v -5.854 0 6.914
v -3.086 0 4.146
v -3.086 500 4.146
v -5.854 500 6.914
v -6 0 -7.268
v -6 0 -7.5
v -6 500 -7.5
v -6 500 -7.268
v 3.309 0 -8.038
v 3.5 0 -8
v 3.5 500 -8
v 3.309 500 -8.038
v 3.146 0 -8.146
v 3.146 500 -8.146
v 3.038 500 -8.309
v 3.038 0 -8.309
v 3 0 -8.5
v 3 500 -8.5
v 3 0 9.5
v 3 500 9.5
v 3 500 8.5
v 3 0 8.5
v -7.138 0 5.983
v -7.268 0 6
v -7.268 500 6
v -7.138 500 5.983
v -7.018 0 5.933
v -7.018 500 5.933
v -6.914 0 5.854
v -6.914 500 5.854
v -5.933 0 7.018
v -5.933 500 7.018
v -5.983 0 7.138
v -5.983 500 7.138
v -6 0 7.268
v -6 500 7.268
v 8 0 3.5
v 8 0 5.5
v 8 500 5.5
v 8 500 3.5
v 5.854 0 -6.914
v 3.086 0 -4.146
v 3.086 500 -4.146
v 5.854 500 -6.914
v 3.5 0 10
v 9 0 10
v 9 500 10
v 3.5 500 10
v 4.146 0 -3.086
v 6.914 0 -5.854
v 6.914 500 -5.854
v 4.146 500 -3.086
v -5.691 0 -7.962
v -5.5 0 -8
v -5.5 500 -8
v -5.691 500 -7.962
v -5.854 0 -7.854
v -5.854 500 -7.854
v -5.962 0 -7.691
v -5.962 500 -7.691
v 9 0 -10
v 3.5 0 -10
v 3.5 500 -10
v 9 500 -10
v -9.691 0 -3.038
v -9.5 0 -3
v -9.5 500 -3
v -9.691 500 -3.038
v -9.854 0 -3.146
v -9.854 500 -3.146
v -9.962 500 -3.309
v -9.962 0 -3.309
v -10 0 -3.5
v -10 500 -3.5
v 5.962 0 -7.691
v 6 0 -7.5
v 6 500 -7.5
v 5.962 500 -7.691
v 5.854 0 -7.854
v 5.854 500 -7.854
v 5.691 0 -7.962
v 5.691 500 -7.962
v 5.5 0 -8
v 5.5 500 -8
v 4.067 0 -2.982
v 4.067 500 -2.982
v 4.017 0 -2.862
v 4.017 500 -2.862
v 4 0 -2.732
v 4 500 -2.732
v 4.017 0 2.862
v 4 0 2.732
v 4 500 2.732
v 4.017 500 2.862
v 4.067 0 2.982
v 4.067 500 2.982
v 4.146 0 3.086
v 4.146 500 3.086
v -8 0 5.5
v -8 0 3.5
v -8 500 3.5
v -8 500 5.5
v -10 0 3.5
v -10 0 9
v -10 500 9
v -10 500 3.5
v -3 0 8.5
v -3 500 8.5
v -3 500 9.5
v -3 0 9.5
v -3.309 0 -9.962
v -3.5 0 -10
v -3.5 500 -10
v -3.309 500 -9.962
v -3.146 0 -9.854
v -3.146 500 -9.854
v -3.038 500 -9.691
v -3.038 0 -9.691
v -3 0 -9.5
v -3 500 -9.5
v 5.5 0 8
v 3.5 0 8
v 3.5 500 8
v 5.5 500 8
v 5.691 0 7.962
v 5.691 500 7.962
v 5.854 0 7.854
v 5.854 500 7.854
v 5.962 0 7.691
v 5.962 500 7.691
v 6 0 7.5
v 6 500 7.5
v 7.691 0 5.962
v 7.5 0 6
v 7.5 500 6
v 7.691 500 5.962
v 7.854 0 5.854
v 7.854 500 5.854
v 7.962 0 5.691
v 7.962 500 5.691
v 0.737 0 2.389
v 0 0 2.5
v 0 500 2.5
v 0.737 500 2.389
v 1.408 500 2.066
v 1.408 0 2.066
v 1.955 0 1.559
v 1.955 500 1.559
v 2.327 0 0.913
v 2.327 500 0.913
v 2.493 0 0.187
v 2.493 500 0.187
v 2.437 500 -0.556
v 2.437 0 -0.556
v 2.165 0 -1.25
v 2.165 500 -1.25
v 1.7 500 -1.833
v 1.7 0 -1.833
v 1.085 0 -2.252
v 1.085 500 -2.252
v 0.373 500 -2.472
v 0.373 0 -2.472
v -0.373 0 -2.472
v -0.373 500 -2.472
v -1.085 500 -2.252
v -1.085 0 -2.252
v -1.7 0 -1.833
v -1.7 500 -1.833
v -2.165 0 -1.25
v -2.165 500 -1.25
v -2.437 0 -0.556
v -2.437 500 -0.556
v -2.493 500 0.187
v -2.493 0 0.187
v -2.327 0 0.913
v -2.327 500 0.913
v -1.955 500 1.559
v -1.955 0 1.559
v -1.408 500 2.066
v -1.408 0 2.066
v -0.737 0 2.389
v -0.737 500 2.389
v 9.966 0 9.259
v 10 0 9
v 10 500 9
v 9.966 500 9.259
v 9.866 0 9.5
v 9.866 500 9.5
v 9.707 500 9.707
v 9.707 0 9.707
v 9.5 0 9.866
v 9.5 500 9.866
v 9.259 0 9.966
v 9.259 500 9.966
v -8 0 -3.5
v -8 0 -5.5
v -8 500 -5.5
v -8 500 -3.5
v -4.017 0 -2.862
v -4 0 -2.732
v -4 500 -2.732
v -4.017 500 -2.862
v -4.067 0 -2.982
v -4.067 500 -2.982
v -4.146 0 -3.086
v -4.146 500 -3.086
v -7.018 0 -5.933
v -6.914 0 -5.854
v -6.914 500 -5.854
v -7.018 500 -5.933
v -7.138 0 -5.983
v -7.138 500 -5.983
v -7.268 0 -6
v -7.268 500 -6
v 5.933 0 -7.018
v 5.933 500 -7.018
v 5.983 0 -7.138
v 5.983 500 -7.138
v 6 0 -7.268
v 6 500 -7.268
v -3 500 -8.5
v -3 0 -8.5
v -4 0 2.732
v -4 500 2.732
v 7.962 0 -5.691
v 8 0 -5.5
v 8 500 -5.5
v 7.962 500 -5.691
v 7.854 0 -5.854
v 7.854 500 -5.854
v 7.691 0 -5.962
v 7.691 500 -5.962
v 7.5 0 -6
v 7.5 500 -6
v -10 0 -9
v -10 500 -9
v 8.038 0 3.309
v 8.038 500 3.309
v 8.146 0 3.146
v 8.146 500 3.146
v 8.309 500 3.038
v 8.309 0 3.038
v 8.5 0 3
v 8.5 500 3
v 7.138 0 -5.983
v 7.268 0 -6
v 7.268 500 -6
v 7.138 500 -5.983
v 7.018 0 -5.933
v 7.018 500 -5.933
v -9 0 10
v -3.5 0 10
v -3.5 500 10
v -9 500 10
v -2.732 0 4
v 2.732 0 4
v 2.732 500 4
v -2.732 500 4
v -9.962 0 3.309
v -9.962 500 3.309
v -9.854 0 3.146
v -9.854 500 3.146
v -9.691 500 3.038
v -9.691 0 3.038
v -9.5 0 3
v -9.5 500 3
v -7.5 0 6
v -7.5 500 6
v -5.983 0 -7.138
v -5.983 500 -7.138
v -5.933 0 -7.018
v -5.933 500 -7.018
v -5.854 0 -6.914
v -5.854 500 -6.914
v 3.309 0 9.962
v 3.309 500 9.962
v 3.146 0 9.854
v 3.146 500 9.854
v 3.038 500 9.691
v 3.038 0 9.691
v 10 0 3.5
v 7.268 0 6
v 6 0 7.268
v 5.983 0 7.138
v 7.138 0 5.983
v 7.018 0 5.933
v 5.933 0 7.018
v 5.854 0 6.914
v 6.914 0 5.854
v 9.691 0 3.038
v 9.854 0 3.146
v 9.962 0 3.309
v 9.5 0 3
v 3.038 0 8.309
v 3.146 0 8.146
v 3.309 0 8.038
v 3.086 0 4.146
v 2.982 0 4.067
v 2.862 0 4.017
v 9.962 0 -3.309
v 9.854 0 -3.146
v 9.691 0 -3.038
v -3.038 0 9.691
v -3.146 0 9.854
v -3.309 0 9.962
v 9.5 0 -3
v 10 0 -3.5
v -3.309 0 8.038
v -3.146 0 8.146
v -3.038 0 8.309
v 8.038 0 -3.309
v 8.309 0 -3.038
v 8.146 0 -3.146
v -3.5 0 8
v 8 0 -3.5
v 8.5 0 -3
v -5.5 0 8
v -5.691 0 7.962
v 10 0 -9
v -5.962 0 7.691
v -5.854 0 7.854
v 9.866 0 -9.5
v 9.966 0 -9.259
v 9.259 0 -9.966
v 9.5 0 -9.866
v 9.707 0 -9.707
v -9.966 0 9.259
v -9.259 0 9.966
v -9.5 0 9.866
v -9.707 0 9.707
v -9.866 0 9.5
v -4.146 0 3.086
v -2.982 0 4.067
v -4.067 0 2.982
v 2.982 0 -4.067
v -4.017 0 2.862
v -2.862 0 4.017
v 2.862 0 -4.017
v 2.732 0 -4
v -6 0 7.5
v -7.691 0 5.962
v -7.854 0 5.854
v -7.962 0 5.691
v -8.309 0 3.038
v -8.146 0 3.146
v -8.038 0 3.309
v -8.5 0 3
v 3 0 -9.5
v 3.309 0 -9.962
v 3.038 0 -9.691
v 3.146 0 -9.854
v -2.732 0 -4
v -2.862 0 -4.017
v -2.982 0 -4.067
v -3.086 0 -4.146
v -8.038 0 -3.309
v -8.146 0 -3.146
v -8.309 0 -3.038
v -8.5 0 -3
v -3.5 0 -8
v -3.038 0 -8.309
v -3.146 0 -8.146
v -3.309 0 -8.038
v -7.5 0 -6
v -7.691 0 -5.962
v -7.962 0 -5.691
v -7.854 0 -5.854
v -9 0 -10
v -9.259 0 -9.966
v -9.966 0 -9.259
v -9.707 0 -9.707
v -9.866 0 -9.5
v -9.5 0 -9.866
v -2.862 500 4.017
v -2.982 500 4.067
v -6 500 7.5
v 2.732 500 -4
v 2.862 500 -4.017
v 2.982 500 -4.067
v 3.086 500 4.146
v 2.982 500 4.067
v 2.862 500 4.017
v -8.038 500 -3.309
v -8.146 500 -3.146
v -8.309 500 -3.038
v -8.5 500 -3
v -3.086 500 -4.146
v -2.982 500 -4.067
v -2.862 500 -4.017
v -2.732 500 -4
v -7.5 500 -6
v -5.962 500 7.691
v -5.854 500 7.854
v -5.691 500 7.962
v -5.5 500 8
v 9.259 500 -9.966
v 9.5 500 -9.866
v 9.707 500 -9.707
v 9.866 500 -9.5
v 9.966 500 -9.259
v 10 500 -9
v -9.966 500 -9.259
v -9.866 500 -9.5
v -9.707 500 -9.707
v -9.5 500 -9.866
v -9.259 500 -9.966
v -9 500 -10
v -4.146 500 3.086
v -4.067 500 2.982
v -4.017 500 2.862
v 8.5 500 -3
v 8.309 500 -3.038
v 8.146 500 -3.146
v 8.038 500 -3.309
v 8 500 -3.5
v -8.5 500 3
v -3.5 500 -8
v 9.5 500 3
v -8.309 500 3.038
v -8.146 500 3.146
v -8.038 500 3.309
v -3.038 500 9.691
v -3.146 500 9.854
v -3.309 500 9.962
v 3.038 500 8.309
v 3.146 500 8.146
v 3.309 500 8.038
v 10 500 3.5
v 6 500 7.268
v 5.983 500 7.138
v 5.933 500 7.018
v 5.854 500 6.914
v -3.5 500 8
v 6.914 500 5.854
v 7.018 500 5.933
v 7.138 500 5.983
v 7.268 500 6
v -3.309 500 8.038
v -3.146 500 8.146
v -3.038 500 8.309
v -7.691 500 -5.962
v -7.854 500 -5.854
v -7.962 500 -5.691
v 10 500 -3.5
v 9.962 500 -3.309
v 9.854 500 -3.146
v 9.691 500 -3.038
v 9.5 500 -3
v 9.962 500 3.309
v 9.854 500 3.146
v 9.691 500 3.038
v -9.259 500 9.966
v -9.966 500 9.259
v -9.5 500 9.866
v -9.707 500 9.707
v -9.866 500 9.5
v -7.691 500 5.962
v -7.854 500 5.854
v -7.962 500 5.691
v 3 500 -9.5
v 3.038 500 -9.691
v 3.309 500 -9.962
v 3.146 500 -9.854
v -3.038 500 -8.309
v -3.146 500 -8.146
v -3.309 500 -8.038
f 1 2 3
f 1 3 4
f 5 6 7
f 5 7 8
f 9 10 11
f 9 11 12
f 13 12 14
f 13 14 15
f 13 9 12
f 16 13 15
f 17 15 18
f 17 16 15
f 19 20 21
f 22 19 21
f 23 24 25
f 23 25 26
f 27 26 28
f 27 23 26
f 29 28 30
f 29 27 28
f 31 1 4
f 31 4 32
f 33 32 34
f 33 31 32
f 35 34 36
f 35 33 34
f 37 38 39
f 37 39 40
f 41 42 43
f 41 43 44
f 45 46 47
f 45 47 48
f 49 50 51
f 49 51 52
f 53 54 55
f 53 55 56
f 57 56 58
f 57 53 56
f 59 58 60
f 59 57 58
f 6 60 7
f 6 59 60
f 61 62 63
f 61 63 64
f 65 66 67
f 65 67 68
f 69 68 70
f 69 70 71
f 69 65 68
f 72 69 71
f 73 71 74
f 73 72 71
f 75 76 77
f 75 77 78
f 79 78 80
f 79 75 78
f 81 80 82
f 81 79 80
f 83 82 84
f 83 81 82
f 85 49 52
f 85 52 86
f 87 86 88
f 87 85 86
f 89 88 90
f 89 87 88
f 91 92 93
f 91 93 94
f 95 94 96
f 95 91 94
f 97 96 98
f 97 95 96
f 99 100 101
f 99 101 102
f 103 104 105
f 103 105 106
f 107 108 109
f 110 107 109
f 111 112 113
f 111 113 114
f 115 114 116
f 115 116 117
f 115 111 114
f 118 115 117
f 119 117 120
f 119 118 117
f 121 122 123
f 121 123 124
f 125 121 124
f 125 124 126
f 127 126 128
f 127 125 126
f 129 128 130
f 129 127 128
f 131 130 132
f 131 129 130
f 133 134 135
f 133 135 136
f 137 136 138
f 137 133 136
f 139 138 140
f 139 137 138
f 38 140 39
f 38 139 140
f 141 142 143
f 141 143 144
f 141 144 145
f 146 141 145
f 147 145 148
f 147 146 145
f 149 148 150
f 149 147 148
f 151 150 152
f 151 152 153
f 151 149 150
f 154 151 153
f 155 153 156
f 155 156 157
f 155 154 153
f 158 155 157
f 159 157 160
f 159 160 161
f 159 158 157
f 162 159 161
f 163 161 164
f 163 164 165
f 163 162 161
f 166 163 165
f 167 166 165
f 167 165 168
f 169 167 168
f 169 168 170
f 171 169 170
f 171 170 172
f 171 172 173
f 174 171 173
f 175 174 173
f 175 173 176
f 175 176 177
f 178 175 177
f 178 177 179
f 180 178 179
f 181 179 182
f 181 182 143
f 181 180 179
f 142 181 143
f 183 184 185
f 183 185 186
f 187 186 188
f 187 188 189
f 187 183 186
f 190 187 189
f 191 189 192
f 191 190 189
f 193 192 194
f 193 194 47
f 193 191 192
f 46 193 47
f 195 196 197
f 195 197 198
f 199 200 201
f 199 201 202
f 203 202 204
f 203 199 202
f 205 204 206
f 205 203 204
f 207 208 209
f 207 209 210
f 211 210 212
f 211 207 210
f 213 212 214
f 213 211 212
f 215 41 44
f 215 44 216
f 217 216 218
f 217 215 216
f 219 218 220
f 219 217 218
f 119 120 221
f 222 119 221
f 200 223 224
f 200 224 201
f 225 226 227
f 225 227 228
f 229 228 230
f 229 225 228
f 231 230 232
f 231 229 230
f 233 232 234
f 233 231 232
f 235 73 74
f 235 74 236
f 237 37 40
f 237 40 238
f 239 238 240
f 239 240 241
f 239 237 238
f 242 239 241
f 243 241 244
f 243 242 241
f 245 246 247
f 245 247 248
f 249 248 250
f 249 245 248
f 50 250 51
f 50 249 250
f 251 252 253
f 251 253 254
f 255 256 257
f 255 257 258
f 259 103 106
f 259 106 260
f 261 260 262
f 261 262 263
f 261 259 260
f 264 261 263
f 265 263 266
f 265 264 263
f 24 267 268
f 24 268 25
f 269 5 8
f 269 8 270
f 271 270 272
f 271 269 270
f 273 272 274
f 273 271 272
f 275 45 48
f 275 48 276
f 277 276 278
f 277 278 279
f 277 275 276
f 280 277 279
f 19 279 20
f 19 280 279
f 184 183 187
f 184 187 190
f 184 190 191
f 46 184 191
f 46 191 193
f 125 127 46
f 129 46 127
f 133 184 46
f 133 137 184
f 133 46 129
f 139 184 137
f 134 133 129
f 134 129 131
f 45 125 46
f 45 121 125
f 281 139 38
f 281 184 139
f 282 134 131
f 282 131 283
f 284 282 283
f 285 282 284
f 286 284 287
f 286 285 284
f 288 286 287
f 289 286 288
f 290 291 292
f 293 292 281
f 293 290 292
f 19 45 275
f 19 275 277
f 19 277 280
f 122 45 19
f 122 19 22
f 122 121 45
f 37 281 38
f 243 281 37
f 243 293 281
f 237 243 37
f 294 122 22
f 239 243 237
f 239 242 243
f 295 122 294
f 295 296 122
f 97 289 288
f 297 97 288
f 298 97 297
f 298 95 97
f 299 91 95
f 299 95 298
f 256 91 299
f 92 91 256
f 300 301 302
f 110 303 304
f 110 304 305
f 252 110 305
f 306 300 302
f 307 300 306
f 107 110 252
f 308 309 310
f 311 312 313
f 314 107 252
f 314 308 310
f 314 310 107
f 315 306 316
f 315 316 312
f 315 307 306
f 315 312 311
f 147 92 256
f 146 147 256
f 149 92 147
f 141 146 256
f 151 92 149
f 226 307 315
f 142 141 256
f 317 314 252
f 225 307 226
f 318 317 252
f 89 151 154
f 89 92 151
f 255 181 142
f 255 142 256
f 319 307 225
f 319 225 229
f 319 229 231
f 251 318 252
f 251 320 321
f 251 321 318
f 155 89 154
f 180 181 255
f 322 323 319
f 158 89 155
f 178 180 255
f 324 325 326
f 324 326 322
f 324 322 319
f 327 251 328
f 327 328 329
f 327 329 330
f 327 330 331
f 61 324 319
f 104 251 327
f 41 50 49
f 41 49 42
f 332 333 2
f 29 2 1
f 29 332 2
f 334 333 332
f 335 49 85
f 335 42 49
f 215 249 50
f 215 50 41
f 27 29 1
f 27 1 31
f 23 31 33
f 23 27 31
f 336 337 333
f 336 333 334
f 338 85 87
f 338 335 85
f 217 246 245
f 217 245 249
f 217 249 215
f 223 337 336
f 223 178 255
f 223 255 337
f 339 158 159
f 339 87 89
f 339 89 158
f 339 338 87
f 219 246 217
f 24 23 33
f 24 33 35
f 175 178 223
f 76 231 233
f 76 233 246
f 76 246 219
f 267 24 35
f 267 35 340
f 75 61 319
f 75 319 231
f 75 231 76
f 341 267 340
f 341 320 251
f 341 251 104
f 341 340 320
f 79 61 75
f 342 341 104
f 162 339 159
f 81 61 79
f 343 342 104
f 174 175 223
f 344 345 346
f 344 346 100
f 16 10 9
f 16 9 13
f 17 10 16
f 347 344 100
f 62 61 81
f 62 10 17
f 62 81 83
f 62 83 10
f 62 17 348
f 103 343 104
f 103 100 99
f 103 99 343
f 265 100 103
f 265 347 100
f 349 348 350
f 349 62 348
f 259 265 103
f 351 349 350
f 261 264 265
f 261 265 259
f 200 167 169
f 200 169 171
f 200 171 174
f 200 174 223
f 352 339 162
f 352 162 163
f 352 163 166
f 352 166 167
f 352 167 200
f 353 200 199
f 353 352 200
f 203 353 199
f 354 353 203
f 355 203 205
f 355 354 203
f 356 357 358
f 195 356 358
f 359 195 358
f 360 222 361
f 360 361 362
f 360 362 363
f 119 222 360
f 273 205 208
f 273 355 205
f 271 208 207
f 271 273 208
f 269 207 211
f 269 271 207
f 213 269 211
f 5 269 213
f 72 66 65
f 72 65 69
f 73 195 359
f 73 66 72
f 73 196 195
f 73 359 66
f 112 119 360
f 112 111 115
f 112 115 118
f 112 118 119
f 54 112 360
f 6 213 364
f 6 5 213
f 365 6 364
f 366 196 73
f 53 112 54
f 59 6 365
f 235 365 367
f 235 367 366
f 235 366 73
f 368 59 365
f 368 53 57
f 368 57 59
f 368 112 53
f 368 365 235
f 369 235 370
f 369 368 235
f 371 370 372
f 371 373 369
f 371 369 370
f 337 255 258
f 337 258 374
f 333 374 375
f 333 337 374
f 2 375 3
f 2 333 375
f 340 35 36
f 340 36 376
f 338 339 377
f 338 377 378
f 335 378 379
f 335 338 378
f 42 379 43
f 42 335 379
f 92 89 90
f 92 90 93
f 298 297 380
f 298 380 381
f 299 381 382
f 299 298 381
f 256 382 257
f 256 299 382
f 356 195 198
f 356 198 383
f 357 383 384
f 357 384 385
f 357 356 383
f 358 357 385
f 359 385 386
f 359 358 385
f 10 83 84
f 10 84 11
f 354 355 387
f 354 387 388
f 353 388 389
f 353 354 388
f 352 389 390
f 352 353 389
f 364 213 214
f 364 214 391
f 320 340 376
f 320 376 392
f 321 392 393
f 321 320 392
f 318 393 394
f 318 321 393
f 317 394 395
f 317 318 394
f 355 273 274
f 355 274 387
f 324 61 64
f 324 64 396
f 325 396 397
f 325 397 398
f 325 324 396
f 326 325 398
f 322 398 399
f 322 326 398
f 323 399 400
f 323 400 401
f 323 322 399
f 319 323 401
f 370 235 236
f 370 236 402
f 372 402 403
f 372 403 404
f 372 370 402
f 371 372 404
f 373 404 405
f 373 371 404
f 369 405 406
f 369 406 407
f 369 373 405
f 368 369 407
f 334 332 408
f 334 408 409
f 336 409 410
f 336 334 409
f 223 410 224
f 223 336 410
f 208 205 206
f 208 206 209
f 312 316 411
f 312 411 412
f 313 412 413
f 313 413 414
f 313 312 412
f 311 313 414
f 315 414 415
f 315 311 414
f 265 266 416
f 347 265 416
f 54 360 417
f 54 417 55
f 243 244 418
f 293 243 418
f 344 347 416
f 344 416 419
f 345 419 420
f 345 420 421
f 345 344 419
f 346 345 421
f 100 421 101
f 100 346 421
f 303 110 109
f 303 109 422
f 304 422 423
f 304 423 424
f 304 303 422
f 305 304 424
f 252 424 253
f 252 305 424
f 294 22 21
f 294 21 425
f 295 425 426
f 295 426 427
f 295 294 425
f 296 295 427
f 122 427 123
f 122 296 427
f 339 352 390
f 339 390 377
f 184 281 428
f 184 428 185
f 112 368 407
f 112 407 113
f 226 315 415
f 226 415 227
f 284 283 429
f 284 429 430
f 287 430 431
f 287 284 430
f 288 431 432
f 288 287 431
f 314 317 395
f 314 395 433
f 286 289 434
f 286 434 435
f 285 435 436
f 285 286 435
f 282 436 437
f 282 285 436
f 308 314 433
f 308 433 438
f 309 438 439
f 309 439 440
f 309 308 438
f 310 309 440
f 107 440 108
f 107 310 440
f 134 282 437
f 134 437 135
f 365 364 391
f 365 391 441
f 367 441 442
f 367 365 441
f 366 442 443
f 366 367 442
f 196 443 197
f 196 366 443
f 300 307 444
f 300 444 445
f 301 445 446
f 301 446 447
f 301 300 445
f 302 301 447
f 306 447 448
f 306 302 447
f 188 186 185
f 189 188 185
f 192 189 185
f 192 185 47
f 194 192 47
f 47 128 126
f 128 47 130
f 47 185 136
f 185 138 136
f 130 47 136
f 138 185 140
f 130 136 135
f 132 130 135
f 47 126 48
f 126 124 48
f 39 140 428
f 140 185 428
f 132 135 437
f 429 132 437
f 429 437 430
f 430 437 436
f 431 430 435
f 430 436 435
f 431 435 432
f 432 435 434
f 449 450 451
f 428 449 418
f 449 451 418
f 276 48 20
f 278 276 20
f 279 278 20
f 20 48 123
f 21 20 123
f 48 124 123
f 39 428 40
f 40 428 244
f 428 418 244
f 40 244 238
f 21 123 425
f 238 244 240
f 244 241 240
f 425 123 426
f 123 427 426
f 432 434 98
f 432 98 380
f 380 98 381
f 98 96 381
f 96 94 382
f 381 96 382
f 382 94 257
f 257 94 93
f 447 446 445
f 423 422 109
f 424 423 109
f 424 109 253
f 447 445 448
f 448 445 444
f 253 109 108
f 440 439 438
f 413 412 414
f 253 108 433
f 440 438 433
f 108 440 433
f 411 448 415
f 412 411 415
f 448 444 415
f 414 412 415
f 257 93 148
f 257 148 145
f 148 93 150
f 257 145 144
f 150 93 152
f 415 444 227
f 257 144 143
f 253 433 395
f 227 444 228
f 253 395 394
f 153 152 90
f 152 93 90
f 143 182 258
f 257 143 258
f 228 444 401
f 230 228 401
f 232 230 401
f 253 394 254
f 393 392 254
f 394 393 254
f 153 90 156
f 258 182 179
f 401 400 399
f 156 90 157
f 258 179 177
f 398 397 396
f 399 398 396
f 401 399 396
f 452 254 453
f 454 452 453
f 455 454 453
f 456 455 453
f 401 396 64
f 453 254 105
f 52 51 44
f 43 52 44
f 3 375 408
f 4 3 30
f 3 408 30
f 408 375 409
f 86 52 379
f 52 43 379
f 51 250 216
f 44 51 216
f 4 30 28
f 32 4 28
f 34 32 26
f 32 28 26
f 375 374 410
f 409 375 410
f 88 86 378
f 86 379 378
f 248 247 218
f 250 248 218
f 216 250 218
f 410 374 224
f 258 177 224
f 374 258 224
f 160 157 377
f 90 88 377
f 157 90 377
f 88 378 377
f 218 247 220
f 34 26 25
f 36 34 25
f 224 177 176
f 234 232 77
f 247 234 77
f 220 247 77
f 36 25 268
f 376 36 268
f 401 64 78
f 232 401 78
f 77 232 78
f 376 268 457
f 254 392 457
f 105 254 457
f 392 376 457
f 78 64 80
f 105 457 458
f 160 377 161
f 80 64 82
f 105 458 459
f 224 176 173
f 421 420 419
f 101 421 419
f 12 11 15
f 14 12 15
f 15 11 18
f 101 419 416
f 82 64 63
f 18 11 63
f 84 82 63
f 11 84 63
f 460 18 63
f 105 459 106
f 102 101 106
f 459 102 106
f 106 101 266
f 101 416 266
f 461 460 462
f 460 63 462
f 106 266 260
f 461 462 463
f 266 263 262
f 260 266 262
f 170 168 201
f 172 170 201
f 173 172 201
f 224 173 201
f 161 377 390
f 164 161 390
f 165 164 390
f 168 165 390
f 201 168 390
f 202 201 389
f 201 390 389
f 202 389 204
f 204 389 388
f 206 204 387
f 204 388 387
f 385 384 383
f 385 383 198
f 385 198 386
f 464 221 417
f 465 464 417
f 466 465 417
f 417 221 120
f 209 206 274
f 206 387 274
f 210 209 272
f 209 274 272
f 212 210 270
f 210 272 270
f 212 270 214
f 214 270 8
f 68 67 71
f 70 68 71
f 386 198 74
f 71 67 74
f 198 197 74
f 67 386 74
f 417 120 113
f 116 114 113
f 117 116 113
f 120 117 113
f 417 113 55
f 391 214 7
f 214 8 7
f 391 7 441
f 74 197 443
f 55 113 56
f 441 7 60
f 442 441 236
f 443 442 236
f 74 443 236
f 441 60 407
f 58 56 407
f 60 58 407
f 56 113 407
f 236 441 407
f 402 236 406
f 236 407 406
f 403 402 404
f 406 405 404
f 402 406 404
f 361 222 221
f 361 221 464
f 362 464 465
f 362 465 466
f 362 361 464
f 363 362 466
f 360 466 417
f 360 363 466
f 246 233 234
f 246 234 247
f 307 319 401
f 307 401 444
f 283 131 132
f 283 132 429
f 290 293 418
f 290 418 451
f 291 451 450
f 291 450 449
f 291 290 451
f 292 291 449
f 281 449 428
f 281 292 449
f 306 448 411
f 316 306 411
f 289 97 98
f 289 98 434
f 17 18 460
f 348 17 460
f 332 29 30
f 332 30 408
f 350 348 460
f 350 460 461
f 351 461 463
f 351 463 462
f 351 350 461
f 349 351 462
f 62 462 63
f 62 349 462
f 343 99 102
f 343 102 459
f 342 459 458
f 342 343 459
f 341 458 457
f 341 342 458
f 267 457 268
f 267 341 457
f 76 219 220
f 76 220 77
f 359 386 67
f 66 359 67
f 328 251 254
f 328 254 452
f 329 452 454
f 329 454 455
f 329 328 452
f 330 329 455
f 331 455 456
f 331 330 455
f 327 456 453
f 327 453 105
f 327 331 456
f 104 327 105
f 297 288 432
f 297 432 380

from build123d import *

# Parameters (mm, degrees)
SKETCH1_R           = 2.5
BOSS_EXTRUDE1_DEPTH = 500


with BuildPart() as part:
    # Sketch1 → Boss-Extrude1 (new body)
    with BuildSketch(Plane(origin=(0, 0, 0), x_dir=(1, 0, 0), z_dir=(0, 1, 0))):
        with BuildLine():
            Line((10, 9), (10, 3.5))
            ThreePointArc((10, 3.5), (9.853553391, 3.146446609), (9.5, 3))
            Line((9.5, 3), (8.5, 3))
            ThreePointArc((8.5, 3), (8.146446609, 3.146446609), (8, 3.5))
            Line((8, 3.5), (8, 5.5))
            ThreePointArc((8, 5.5), (7.853553391, 5.853553391), (7.5, 6))
            Line((7.5, 6), (7.267766953, 6))
            ThreePointArc((7.267766953, 6), (7.076425237, 5.961939766), (6.914213562, 5.853553391))
            Line((6.914213562, 5.853553391), (4.146446609, 3.085786438))
            ThreePointArc((4.146446609, 3.085786438), (4.038060234, 2.923574763), (4, 2.732233047))
            Line((4, 2.732233047), (4, -2.732233047))
            ThreePointArc((4, -2.732233047), (4.038060234, -2.923574763), (4.146446609, -3.085786438))
            Line((4.146446609, -3.085786438), (6.914213562, -5.853553391))
            ThreePointArc((6.914213562, -5.853553391), (7.076425237, -5.961939766), (7.267766953, -6))
            Line((7.267766953, -6), (7.5, -6))
            ThreePointArc((7.5, -6), (7.853553391, -5.853553391), (8, -5.5))
            Line((8, -5.5), (8, -3.5))
            ThreePointArc((8, -3.5), (8.146446609, -3.146446609), (8.5, -3))
            Line((8.5, -3), (9.5, -3))
            ThreePointArc((9.5, -3), (9.853553391, -3.146446609), (10, -3.5))
            Line((10, -3.5), (10, -9))
            ThreePointArc((10, -9), (9.707106781, -9.707106781), (9, -10))
            Line((9, -10), (3.5, -10))
            ThreePointArc((3.5, -10), (3.146446609, -9.853553391), (3, -9.5))
            Line((3, -9.5), (3, -8.5))
            ThreePointArc((3, -8.5), (3.146446609, -8.146446609), (3.5, -8))
            Line((3.5, -8), (5.5, -8))
            ThreePointArc((5.5, -8), (5.853553391, -7.853553391), (6, -7.5))
            Line((6, -7.5), (6, -7.267766953))
            ThreePointArc((6, -7.267766953), (5.961939766, -7.076425237), (5.853553391, -6.914213562))
            Line((5.853553391, -6.914213562), (3.085786438, -4.146446609))
            ThreePointArc((3.085786438, -4.146446609), (2.923574763, -4.038060234), (2.732233047, -4))
            Line((2.732233047, -4), (-2.732233047, -4))
            ThreePointArc((-2.732233047, -4), (-2.923574763, -4.038060234), (-3.085786438, -4.146446609))
            Line((-3.085786438, -4.146446609), (-5.853553391, -6.914213562))
            ThreePointArc((-5.853553391, -6.914213562), (-5.961939766, -7.076425237), (-6, -7.267766953))
            Line((-6, -7.267766953), (-6, -7.5))
            ThreePointArc((-6, -7.5), (-5.853553391, -7.853553391), (-5.5, -8))
            Line((-5.5, -8), (-3.5, -8))
            ThreePointArc((-3.5, -8), (-3.146446609, -8.146446609), (-3, -8.5))
            Line((-3, -8.5), (-3, -9.5))
            ThreePointArc((-3, -9.5), (-3.146446609, -9.853553391), (-3.5, -10))
            Line((-3.5, -10), (-9, -10))
            ThreePointArc((-9, -10), (-9.707106781, -9.707106781), (-10, -9))
            Line((-10, -9), (-10, -3.5))
            ThreePointArc((-10, -3.5), (-9.853553391, -3.146446609), (-9.5, -3))
            Line((-9.5, -3), (-8.5, -3))
            ThreePointArc((-8.5, -3), (-8.146446609, -3.146446609), (-8, -3.5))
            Line((-8, -3.5), (-8, -5.5))
            ThreePointArc((-8, -5.5), (-7.853553391, -5.853553391), (-7.5, -6))
            Line((-7.5, -6), (-7.267766953, -6))
            ThreePointArc((-7.267766953, -6), (-7.076425237, -5.961939766), (-6.914213562, -5.853553391))
            Line((-6.914213562, -5.853553391), (-4.146446609, -3.085786438))
            ThreePointArc((-4.146446609, -3.085786438), (-4.038060234, -2.923574763), (-4, -2.732233047))
            Line((-4, -2.732233047), (-4, 2.732233047))
            ThreePointArc((-4, 2.732233047), (-4.038060234, 2.923574763), (-4.146446609, 3.085786438))
            Line((-4.146446609, 3.085786438), (-6.914213562, 5.853553391))
            ThreePointArc((-6.914213562, 5.853553391), (-7.076425237, 5.961939766), (-7.267766953, 6))
            Line((-7.267766953, 6), (-7.5, 6))
            ThreePointArc((-7.5, 6), (-7.853553391, 5.853553391), (-8, 5.5))
            Line((-8, 5.5), (-8, 3.5))
            ThreePointArc((-8, 3.5), (-8.146446609, 3.146446609), (-8.5, 3))
            Line((-8.5, 3), (-9.5, 3))
            ThreePointArc((-9.5, 3), (-9.853553391, 3.146446609), (-10, 3.5))
            Line((-10, 3.5), (-10, 9))
            ThreePointArc((-10, 9), (-9.707106781, 9.707106781), (-9, 10))
            Line((-9, 10), (-3.5, 10))
            ThreePointArc((-3.5, 10), (-3.146446609, 9.853553391), (-3, 9.5))
            Line((-3, 9.5), (-3, 8.5))
            ThreePointArc((-3, 8.5), (-3.146446609, 8.146446609), (-3.5, 8))
            Line((-3.5, 8), (-5.5, 8))
            ThreePointArc((-5.5, 8), (-5.853553391, 7.853553391), (-6, 7.5))
            Line((-6, 7.5), (-6, 7.267766953))
            ThreePointArc((-6, 7.267766953), (-5.961939766, 7.076425237), (-5.853553391, 6.914213562))
            Line((-5.853553391, 6.914213562), (-3.085786438, 4.146446609))
            ThreePointArc((-3.085786438, 4.146446609), (-2.923574763, 4.038060234), (-2.732233047, 4))
            Line((-2.732233047, 4), (2.732233047, 4))
            ThreePointArc((2.732233047, 4), (2.923574763, 4.038060234), (3.085786438, 4.146446609))
            Line((3.085786438, 4.146446609), (5.853553391, 6.914213562))
            ThreePointArc((5.853553391, 6.914213562), (5.961939766, 7.076425237), (6, 7.267766953))
            Line((6, 7.267766953), (6, 7.5))
            ThreePointArc((6, 7.5), (5.853553391, 7.853553391), (5.5, 8))
            Line((5.5, 8), (3.5, 8))
            ThreePointArc((3.5, 8), (3.146446609, 8.146446609), (3, 8.5))
            Line((3, 8.5), (3, 9.5))
            ThreePointArc((3, 9.5), (3.146446609, 9.853553391), (3.5, 10))
            Line((3.5, 10), (9, 10))
            ThreePointArc((9, 10), (9.707106781, 9.707106781), (10, 9))
        make_face()
        with Locations(Location((0, 0, 0), (0, 0, 270))):
            Circle(SKETCH1_R, mode=Mode.SUBTRACT)
    extrude(amount=BOSS_EXTRUDE1_DEPTH)


solid = part.part
